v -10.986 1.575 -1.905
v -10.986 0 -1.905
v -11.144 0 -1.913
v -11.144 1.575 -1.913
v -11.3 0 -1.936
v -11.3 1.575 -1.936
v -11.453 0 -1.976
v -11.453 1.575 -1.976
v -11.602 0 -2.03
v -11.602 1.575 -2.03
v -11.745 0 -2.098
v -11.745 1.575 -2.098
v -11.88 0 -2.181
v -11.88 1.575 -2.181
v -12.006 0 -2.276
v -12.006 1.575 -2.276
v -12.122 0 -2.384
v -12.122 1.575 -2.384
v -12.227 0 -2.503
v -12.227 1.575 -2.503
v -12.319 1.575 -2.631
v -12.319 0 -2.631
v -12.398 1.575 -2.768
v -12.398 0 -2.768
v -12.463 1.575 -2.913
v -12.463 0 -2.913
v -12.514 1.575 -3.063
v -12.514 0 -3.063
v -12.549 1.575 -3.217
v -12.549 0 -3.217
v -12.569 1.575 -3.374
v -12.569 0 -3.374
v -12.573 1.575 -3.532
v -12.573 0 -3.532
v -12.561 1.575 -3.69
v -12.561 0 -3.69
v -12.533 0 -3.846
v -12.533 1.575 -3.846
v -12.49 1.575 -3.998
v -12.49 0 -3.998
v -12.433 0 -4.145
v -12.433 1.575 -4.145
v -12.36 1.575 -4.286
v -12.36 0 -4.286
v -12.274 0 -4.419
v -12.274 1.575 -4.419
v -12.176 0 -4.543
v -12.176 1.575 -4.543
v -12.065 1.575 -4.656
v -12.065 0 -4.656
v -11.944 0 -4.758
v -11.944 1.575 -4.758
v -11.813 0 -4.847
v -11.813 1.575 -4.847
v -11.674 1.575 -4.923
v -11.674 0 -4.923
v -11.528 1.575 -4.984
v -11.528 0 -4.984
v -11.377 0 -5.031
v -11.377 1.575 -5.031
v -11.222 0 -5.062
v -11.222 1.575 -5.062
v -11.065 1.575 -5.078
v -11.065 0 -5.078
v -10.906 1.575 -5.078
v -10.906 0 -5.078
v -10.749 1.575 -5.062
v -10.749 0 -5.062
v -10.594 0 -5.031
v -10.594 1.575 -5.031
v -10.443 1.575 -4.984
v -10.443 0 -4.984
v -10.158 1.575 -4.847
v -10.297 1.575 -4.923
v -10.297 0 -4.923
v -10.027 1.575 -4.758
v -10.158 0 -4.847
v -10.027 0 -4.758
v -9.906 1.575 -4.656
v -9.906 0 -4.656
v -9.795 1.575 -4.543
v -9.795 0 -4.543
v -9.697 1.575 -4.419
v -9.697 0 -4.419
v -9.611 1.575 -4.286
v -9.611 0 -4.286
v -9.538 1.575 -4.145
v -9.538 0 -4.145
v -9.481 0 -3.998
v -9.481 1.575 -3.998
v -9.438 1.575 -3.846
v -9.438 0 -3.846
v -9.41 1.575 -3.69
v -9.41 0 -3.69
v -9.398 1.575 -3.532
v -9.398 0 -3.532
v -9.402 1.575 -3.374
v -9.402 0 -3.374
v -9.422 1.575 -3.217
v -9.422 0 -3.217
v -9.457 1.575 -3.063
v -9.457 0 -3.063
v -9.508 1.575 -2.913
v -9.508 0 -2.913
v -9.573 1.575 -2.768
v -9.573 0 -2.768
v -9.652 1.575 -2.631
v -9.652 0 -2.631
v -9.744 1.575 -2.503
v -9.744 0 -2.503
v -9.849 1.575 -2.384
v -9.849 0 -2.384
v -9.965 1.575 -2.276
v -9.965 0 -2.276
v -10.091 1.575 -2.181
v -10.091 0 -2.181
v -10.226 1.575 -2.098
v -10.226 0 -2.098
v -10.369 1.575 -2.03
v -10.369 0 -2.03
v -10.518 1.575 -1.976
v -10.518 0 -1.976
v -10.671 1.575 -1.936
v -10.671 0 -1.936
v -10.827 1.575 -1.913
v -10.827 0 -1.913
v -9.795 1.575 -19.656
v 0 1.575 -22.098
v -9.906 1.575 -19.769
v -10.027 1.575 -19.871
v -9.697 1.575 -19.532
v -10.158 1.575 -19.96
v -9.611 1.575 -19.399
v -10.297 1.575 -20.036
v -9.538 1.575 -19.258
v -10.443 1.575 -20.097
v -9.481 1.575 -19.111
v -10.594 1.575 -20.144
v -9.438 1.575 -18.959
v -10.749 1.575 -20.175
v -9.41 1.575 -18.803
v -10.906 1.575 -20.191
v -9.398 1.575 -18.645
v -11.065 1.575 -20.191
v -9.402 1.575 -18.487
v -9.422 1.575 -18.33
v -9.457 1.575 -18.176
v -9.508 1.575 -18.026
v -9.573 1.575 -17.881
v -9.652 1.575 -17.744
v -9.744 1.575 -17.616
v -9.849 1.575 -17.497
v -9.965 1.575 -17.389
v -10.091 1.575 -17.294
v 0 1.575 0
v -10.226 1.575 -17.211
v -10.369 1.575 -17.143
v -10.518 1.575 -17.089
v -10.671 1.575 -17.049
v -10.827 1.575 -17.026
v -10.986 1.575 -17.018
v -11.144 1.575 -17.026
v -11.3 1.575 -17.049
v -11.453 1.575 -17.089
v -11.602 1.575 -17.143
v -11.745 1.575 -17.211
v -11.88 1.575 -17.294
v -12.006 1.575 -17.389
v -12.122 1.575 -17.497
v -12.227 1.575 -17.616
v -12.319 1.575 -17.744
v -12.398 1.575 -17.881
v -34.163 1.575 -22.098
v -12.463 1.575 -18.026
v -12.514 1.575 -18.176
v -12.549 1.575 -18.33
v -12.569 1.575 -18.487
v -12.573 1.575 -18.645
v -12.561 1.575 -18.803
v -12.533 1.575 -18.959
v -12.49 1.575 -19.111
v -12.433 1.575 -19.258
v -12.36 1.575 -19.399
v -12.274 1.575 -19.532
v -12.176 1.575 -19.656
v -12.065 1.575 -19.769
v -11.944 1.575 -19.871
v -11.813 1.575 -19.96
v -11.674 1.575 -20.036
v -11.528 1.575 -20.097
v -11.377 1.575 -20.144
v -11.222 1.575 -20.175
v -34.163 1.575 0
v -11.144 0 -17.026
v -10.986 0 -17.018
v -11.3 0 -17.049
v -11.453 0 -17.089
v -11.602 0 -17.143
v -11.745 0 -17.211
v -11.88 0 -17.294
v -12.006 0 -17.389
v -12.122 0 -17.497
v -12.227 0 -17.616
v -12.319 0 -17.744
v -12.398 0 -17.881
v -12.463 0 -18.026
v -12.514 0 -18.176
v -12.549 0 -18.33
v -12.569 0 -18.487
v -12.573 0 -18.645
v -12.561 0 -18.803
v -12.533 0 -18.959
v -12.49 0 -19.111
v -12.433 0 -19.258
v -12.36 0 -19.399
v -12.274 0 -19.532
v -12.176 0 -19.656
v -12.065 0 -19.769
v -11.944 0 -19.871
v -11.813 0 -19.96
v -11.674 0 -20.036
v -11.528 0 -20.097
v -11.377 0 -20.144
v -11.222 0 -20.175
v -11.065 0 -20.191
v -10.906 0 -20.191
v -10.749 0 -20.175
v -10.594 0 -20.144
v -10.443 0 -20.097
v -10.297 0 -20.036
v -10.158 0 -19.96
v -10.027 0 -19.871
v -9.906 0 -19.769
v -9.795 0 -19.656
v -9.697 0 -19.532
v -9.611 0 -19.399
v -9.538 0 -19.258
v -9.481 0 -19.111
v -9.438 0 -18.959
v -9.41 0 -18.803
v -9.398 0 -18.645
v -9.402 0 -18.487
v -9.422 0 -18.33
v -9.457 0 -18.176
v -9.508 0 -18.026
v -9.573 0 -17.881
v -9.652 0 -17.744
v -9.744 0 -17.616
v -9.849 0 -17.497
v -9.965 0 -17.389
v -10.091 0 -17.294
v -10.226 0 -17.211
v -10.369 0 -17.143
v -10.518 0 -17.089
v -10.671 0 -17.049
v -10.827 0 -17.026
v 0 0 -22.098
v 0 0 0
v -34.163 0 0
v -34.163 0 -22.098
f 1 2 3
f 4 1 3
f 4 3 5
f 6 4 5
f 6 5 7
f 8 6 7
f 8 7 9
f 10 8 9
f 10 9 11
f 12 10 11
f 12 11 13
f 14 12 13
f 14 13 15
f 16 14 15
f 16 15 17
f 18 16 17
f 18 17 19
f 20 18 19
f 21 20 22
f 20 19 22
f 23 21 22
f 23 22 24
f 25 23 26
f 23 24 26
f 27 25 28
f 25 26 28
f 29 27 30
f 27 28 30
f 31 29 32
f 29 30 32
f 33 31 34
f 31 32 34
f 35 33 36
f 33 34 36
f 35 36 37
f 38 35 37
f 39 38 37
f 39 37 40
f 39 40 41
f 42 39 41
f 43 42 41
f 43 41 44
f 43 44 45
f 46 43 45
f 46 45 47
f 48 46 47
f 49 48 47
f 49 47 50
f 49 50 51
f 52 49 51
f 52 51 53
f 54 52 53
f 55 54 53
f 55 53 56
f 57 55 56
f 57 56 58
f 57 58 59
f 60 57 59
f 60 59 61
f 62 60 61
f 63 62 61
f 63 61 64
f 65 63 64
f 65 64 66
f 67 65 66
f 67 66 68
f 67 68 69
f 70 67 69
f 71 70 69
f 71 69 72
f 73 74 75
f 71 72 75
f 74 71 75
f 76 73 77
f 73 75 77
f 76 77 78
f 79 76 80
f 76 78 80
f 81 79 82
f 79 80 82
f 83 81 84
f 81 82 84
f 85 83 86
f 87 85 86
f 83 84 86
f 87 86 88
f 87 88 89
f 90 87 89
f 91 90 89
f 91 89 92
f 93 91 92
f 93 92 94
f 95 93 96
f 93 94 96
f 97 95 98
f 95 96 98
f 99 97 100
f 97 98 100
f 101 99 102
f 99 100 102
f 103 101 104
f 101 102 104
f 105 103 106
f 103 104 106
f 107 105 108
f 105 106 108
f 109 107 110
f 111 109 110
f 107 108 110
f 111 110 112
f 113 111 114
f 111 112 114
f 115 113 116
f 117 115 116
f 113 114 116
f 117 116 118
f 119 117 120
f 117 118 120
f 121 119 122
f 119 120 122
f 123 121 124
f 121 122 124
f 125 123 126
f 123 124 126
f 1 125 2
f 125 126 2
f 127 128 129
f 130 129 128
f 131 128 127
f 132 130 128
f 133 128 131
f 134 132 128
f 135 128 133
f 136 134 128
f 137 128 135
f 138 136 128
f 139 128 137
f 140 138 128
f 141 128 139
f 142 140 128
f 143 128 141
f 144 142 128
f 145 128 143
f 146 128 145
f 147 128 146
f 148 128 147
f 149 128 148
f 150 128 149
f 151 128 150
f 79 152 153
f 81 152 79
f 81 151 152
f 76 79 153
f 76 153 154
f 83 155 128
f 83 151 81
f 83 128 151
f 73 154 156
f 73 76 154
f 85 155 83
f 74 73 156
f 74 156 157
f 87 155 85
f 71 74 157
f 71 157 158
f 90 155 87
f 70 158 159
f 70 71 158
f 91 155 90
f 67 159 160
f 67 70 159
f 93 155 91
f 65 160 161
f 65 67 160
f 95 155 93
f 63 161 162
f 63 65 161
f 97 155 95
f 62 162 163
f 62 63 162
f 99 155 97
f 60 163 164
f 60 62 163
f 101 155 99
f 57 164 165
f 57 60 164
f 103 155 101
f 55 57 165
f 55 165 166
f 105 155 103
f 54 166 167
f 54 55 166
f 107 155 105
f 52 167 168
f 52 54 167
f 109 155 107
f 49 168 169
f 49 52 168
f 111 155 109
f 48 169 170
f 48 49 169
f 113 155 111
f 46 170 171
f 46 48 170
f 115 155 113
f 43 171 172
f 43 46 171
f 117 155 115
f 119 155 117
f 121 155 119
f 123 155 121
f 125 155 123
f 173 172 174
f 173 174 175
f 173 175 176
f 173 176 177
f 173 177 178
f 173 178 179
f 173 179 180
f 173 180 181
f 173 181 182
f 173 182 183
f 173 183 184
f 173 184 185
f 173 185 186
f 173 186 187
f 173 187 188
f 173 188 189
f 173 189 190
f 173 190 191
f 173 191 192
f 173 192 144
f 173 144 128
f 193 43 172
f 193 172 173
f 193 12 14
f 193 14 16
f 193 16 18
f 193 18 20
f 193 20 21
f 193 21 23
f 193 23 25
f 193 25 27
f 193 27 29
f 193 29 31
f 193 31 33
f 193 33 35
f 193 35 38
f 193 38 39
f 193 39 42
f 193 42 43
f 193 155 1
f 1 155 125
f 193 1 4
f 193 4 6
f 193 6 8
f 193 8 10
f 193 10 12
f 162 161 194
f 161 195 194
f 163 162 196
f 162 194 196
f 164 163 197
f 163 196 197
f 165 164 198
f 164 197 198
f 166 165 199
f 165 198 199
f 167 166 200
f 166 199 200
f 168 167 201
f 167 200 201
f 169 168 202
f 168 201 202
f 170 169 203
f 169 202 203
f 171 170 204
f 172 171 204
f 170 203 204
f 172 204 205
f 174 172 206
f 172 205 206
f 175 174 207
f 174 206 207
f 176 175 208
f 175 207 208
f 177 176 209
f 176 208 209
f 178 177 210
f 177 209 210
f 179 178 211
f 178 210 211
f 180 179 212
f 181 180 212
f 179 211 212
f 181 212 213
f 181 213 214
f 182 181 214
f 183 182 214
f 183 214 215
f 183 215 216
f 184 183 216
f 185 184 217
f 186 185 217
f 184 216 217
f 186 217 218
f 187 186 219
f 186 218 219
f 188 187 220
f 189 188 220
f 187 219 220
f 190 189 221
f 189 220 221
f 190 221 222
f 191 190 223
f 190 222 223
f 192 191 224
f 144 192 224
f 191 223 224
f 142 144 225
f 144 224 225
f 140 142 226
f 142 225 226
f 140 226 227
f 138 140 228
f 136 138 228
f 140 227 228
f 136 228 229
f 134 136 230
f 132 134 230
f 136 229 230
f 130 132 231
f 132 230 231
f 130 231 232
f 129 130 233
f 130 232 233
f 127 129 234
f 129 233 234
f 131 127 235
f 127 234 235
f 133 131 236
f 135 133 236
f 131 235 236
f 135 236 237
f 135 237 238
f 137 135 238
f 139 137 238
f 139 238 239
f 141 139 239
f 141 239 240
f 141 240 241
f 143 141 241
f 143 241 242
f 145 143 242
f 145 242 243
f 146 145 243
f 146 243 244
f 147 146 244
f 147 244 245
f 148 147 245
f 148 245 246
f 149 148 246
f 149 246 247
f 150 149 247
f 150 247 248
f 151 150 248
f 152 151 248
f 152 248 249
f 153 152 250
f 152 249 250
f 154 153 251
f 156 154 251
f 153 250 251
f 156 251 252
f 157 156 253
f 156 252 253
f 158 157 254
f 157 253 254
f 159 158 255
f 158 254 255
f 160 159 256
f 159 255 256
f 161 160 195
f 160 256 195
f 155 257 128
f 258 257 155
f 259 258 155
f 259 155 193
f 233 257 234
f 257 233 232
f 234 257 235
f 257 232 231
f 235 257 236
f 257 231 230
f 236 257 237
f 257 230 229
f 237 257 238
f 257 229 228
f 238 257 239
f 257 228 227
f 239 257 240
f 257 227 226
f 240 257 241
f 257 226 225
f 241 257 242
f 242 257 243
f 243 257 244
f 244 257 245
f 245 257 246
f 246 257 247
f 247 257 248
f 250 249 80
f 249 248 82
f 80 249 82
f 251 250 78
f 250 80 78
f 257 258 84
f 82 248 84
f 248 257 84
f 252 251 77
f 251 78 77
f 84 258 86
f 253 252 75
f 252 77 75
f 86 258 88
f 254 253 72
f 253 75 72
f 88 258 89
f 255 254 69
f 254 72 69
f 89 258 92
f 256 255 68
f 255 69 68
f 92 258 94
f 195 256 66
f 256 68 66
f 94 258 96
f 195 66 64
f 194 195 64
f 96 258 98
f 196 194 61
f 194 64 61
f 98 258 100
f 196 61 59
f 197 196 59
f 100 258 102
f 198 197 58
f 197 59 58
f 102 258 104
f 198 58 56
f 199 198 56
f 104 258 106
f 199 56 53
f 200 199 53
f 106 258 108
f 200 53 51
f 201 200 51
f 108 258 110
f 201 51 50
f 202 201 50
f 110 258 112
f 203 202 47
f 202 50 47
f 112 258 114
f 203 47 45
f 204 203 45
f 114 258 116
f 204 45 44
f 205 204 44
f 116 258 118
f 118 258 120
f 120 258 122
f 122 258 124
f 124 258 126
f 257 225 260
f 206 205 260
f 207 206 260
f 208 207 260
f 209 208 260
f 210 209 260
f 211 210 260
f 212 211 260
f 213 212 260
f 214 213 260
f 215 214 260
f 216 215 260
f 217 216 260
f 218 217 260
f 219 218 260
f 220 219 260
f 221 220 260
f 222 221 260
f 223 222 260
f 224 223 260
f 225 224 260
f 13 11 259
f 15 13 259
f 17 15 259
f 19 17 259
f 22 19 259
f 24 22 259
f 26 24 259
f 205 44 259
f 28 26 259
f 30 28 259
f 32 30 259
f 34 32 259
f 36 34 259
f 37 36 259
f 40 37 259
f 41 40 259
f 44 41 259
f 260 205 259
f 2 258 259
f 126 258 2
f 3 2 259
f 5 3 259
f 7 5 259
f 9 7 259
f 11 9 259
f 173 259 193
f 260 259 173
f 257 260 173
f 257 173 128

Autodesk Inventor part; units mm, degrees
ref_plane "YZ Plane" through (0, 0, 0) normal (1, 0, 0) x (0, 1, 0)
ref_plane "XZ Plane" through (0, 0, 0) normal (0, 1, 0) x (-1, 0, 0)
ref_plane "XY Plane" through (0, 0, 0) normal (0, 0, 1) x (1, 0, 0)
sketch "Sketch1" plane through (0, 0, 0) normal (0, 1, 0) x (-1, 0, 0)
  line L0 (0, 0) -> (34.163, 0)
  line L1 (34.163, 0) -> (34.163, -22.098)
  line L2 (34.163, -22.098) -> (0, -22.098)
  line L3 (0, -22.098) -> (0, 0)
  dimension "d0" = 34.163
  dimension "d1" = 22.098
extrude "Extrusion1" add sketch "Sketch1" along normal blind 1.5748
hole "Hole2" at (-10.9855, 1.5748, -3.4925) direction (0, -1, 0) diameter 3.175 depth 25.4 tip angle 118
hole "Hole3" at (-10.9855, 1.5748, -18.6055) direction (0, -1, 0) diameter 3.175 depth 25.4 tip angle 118
properties part number "temp_probe_board"
